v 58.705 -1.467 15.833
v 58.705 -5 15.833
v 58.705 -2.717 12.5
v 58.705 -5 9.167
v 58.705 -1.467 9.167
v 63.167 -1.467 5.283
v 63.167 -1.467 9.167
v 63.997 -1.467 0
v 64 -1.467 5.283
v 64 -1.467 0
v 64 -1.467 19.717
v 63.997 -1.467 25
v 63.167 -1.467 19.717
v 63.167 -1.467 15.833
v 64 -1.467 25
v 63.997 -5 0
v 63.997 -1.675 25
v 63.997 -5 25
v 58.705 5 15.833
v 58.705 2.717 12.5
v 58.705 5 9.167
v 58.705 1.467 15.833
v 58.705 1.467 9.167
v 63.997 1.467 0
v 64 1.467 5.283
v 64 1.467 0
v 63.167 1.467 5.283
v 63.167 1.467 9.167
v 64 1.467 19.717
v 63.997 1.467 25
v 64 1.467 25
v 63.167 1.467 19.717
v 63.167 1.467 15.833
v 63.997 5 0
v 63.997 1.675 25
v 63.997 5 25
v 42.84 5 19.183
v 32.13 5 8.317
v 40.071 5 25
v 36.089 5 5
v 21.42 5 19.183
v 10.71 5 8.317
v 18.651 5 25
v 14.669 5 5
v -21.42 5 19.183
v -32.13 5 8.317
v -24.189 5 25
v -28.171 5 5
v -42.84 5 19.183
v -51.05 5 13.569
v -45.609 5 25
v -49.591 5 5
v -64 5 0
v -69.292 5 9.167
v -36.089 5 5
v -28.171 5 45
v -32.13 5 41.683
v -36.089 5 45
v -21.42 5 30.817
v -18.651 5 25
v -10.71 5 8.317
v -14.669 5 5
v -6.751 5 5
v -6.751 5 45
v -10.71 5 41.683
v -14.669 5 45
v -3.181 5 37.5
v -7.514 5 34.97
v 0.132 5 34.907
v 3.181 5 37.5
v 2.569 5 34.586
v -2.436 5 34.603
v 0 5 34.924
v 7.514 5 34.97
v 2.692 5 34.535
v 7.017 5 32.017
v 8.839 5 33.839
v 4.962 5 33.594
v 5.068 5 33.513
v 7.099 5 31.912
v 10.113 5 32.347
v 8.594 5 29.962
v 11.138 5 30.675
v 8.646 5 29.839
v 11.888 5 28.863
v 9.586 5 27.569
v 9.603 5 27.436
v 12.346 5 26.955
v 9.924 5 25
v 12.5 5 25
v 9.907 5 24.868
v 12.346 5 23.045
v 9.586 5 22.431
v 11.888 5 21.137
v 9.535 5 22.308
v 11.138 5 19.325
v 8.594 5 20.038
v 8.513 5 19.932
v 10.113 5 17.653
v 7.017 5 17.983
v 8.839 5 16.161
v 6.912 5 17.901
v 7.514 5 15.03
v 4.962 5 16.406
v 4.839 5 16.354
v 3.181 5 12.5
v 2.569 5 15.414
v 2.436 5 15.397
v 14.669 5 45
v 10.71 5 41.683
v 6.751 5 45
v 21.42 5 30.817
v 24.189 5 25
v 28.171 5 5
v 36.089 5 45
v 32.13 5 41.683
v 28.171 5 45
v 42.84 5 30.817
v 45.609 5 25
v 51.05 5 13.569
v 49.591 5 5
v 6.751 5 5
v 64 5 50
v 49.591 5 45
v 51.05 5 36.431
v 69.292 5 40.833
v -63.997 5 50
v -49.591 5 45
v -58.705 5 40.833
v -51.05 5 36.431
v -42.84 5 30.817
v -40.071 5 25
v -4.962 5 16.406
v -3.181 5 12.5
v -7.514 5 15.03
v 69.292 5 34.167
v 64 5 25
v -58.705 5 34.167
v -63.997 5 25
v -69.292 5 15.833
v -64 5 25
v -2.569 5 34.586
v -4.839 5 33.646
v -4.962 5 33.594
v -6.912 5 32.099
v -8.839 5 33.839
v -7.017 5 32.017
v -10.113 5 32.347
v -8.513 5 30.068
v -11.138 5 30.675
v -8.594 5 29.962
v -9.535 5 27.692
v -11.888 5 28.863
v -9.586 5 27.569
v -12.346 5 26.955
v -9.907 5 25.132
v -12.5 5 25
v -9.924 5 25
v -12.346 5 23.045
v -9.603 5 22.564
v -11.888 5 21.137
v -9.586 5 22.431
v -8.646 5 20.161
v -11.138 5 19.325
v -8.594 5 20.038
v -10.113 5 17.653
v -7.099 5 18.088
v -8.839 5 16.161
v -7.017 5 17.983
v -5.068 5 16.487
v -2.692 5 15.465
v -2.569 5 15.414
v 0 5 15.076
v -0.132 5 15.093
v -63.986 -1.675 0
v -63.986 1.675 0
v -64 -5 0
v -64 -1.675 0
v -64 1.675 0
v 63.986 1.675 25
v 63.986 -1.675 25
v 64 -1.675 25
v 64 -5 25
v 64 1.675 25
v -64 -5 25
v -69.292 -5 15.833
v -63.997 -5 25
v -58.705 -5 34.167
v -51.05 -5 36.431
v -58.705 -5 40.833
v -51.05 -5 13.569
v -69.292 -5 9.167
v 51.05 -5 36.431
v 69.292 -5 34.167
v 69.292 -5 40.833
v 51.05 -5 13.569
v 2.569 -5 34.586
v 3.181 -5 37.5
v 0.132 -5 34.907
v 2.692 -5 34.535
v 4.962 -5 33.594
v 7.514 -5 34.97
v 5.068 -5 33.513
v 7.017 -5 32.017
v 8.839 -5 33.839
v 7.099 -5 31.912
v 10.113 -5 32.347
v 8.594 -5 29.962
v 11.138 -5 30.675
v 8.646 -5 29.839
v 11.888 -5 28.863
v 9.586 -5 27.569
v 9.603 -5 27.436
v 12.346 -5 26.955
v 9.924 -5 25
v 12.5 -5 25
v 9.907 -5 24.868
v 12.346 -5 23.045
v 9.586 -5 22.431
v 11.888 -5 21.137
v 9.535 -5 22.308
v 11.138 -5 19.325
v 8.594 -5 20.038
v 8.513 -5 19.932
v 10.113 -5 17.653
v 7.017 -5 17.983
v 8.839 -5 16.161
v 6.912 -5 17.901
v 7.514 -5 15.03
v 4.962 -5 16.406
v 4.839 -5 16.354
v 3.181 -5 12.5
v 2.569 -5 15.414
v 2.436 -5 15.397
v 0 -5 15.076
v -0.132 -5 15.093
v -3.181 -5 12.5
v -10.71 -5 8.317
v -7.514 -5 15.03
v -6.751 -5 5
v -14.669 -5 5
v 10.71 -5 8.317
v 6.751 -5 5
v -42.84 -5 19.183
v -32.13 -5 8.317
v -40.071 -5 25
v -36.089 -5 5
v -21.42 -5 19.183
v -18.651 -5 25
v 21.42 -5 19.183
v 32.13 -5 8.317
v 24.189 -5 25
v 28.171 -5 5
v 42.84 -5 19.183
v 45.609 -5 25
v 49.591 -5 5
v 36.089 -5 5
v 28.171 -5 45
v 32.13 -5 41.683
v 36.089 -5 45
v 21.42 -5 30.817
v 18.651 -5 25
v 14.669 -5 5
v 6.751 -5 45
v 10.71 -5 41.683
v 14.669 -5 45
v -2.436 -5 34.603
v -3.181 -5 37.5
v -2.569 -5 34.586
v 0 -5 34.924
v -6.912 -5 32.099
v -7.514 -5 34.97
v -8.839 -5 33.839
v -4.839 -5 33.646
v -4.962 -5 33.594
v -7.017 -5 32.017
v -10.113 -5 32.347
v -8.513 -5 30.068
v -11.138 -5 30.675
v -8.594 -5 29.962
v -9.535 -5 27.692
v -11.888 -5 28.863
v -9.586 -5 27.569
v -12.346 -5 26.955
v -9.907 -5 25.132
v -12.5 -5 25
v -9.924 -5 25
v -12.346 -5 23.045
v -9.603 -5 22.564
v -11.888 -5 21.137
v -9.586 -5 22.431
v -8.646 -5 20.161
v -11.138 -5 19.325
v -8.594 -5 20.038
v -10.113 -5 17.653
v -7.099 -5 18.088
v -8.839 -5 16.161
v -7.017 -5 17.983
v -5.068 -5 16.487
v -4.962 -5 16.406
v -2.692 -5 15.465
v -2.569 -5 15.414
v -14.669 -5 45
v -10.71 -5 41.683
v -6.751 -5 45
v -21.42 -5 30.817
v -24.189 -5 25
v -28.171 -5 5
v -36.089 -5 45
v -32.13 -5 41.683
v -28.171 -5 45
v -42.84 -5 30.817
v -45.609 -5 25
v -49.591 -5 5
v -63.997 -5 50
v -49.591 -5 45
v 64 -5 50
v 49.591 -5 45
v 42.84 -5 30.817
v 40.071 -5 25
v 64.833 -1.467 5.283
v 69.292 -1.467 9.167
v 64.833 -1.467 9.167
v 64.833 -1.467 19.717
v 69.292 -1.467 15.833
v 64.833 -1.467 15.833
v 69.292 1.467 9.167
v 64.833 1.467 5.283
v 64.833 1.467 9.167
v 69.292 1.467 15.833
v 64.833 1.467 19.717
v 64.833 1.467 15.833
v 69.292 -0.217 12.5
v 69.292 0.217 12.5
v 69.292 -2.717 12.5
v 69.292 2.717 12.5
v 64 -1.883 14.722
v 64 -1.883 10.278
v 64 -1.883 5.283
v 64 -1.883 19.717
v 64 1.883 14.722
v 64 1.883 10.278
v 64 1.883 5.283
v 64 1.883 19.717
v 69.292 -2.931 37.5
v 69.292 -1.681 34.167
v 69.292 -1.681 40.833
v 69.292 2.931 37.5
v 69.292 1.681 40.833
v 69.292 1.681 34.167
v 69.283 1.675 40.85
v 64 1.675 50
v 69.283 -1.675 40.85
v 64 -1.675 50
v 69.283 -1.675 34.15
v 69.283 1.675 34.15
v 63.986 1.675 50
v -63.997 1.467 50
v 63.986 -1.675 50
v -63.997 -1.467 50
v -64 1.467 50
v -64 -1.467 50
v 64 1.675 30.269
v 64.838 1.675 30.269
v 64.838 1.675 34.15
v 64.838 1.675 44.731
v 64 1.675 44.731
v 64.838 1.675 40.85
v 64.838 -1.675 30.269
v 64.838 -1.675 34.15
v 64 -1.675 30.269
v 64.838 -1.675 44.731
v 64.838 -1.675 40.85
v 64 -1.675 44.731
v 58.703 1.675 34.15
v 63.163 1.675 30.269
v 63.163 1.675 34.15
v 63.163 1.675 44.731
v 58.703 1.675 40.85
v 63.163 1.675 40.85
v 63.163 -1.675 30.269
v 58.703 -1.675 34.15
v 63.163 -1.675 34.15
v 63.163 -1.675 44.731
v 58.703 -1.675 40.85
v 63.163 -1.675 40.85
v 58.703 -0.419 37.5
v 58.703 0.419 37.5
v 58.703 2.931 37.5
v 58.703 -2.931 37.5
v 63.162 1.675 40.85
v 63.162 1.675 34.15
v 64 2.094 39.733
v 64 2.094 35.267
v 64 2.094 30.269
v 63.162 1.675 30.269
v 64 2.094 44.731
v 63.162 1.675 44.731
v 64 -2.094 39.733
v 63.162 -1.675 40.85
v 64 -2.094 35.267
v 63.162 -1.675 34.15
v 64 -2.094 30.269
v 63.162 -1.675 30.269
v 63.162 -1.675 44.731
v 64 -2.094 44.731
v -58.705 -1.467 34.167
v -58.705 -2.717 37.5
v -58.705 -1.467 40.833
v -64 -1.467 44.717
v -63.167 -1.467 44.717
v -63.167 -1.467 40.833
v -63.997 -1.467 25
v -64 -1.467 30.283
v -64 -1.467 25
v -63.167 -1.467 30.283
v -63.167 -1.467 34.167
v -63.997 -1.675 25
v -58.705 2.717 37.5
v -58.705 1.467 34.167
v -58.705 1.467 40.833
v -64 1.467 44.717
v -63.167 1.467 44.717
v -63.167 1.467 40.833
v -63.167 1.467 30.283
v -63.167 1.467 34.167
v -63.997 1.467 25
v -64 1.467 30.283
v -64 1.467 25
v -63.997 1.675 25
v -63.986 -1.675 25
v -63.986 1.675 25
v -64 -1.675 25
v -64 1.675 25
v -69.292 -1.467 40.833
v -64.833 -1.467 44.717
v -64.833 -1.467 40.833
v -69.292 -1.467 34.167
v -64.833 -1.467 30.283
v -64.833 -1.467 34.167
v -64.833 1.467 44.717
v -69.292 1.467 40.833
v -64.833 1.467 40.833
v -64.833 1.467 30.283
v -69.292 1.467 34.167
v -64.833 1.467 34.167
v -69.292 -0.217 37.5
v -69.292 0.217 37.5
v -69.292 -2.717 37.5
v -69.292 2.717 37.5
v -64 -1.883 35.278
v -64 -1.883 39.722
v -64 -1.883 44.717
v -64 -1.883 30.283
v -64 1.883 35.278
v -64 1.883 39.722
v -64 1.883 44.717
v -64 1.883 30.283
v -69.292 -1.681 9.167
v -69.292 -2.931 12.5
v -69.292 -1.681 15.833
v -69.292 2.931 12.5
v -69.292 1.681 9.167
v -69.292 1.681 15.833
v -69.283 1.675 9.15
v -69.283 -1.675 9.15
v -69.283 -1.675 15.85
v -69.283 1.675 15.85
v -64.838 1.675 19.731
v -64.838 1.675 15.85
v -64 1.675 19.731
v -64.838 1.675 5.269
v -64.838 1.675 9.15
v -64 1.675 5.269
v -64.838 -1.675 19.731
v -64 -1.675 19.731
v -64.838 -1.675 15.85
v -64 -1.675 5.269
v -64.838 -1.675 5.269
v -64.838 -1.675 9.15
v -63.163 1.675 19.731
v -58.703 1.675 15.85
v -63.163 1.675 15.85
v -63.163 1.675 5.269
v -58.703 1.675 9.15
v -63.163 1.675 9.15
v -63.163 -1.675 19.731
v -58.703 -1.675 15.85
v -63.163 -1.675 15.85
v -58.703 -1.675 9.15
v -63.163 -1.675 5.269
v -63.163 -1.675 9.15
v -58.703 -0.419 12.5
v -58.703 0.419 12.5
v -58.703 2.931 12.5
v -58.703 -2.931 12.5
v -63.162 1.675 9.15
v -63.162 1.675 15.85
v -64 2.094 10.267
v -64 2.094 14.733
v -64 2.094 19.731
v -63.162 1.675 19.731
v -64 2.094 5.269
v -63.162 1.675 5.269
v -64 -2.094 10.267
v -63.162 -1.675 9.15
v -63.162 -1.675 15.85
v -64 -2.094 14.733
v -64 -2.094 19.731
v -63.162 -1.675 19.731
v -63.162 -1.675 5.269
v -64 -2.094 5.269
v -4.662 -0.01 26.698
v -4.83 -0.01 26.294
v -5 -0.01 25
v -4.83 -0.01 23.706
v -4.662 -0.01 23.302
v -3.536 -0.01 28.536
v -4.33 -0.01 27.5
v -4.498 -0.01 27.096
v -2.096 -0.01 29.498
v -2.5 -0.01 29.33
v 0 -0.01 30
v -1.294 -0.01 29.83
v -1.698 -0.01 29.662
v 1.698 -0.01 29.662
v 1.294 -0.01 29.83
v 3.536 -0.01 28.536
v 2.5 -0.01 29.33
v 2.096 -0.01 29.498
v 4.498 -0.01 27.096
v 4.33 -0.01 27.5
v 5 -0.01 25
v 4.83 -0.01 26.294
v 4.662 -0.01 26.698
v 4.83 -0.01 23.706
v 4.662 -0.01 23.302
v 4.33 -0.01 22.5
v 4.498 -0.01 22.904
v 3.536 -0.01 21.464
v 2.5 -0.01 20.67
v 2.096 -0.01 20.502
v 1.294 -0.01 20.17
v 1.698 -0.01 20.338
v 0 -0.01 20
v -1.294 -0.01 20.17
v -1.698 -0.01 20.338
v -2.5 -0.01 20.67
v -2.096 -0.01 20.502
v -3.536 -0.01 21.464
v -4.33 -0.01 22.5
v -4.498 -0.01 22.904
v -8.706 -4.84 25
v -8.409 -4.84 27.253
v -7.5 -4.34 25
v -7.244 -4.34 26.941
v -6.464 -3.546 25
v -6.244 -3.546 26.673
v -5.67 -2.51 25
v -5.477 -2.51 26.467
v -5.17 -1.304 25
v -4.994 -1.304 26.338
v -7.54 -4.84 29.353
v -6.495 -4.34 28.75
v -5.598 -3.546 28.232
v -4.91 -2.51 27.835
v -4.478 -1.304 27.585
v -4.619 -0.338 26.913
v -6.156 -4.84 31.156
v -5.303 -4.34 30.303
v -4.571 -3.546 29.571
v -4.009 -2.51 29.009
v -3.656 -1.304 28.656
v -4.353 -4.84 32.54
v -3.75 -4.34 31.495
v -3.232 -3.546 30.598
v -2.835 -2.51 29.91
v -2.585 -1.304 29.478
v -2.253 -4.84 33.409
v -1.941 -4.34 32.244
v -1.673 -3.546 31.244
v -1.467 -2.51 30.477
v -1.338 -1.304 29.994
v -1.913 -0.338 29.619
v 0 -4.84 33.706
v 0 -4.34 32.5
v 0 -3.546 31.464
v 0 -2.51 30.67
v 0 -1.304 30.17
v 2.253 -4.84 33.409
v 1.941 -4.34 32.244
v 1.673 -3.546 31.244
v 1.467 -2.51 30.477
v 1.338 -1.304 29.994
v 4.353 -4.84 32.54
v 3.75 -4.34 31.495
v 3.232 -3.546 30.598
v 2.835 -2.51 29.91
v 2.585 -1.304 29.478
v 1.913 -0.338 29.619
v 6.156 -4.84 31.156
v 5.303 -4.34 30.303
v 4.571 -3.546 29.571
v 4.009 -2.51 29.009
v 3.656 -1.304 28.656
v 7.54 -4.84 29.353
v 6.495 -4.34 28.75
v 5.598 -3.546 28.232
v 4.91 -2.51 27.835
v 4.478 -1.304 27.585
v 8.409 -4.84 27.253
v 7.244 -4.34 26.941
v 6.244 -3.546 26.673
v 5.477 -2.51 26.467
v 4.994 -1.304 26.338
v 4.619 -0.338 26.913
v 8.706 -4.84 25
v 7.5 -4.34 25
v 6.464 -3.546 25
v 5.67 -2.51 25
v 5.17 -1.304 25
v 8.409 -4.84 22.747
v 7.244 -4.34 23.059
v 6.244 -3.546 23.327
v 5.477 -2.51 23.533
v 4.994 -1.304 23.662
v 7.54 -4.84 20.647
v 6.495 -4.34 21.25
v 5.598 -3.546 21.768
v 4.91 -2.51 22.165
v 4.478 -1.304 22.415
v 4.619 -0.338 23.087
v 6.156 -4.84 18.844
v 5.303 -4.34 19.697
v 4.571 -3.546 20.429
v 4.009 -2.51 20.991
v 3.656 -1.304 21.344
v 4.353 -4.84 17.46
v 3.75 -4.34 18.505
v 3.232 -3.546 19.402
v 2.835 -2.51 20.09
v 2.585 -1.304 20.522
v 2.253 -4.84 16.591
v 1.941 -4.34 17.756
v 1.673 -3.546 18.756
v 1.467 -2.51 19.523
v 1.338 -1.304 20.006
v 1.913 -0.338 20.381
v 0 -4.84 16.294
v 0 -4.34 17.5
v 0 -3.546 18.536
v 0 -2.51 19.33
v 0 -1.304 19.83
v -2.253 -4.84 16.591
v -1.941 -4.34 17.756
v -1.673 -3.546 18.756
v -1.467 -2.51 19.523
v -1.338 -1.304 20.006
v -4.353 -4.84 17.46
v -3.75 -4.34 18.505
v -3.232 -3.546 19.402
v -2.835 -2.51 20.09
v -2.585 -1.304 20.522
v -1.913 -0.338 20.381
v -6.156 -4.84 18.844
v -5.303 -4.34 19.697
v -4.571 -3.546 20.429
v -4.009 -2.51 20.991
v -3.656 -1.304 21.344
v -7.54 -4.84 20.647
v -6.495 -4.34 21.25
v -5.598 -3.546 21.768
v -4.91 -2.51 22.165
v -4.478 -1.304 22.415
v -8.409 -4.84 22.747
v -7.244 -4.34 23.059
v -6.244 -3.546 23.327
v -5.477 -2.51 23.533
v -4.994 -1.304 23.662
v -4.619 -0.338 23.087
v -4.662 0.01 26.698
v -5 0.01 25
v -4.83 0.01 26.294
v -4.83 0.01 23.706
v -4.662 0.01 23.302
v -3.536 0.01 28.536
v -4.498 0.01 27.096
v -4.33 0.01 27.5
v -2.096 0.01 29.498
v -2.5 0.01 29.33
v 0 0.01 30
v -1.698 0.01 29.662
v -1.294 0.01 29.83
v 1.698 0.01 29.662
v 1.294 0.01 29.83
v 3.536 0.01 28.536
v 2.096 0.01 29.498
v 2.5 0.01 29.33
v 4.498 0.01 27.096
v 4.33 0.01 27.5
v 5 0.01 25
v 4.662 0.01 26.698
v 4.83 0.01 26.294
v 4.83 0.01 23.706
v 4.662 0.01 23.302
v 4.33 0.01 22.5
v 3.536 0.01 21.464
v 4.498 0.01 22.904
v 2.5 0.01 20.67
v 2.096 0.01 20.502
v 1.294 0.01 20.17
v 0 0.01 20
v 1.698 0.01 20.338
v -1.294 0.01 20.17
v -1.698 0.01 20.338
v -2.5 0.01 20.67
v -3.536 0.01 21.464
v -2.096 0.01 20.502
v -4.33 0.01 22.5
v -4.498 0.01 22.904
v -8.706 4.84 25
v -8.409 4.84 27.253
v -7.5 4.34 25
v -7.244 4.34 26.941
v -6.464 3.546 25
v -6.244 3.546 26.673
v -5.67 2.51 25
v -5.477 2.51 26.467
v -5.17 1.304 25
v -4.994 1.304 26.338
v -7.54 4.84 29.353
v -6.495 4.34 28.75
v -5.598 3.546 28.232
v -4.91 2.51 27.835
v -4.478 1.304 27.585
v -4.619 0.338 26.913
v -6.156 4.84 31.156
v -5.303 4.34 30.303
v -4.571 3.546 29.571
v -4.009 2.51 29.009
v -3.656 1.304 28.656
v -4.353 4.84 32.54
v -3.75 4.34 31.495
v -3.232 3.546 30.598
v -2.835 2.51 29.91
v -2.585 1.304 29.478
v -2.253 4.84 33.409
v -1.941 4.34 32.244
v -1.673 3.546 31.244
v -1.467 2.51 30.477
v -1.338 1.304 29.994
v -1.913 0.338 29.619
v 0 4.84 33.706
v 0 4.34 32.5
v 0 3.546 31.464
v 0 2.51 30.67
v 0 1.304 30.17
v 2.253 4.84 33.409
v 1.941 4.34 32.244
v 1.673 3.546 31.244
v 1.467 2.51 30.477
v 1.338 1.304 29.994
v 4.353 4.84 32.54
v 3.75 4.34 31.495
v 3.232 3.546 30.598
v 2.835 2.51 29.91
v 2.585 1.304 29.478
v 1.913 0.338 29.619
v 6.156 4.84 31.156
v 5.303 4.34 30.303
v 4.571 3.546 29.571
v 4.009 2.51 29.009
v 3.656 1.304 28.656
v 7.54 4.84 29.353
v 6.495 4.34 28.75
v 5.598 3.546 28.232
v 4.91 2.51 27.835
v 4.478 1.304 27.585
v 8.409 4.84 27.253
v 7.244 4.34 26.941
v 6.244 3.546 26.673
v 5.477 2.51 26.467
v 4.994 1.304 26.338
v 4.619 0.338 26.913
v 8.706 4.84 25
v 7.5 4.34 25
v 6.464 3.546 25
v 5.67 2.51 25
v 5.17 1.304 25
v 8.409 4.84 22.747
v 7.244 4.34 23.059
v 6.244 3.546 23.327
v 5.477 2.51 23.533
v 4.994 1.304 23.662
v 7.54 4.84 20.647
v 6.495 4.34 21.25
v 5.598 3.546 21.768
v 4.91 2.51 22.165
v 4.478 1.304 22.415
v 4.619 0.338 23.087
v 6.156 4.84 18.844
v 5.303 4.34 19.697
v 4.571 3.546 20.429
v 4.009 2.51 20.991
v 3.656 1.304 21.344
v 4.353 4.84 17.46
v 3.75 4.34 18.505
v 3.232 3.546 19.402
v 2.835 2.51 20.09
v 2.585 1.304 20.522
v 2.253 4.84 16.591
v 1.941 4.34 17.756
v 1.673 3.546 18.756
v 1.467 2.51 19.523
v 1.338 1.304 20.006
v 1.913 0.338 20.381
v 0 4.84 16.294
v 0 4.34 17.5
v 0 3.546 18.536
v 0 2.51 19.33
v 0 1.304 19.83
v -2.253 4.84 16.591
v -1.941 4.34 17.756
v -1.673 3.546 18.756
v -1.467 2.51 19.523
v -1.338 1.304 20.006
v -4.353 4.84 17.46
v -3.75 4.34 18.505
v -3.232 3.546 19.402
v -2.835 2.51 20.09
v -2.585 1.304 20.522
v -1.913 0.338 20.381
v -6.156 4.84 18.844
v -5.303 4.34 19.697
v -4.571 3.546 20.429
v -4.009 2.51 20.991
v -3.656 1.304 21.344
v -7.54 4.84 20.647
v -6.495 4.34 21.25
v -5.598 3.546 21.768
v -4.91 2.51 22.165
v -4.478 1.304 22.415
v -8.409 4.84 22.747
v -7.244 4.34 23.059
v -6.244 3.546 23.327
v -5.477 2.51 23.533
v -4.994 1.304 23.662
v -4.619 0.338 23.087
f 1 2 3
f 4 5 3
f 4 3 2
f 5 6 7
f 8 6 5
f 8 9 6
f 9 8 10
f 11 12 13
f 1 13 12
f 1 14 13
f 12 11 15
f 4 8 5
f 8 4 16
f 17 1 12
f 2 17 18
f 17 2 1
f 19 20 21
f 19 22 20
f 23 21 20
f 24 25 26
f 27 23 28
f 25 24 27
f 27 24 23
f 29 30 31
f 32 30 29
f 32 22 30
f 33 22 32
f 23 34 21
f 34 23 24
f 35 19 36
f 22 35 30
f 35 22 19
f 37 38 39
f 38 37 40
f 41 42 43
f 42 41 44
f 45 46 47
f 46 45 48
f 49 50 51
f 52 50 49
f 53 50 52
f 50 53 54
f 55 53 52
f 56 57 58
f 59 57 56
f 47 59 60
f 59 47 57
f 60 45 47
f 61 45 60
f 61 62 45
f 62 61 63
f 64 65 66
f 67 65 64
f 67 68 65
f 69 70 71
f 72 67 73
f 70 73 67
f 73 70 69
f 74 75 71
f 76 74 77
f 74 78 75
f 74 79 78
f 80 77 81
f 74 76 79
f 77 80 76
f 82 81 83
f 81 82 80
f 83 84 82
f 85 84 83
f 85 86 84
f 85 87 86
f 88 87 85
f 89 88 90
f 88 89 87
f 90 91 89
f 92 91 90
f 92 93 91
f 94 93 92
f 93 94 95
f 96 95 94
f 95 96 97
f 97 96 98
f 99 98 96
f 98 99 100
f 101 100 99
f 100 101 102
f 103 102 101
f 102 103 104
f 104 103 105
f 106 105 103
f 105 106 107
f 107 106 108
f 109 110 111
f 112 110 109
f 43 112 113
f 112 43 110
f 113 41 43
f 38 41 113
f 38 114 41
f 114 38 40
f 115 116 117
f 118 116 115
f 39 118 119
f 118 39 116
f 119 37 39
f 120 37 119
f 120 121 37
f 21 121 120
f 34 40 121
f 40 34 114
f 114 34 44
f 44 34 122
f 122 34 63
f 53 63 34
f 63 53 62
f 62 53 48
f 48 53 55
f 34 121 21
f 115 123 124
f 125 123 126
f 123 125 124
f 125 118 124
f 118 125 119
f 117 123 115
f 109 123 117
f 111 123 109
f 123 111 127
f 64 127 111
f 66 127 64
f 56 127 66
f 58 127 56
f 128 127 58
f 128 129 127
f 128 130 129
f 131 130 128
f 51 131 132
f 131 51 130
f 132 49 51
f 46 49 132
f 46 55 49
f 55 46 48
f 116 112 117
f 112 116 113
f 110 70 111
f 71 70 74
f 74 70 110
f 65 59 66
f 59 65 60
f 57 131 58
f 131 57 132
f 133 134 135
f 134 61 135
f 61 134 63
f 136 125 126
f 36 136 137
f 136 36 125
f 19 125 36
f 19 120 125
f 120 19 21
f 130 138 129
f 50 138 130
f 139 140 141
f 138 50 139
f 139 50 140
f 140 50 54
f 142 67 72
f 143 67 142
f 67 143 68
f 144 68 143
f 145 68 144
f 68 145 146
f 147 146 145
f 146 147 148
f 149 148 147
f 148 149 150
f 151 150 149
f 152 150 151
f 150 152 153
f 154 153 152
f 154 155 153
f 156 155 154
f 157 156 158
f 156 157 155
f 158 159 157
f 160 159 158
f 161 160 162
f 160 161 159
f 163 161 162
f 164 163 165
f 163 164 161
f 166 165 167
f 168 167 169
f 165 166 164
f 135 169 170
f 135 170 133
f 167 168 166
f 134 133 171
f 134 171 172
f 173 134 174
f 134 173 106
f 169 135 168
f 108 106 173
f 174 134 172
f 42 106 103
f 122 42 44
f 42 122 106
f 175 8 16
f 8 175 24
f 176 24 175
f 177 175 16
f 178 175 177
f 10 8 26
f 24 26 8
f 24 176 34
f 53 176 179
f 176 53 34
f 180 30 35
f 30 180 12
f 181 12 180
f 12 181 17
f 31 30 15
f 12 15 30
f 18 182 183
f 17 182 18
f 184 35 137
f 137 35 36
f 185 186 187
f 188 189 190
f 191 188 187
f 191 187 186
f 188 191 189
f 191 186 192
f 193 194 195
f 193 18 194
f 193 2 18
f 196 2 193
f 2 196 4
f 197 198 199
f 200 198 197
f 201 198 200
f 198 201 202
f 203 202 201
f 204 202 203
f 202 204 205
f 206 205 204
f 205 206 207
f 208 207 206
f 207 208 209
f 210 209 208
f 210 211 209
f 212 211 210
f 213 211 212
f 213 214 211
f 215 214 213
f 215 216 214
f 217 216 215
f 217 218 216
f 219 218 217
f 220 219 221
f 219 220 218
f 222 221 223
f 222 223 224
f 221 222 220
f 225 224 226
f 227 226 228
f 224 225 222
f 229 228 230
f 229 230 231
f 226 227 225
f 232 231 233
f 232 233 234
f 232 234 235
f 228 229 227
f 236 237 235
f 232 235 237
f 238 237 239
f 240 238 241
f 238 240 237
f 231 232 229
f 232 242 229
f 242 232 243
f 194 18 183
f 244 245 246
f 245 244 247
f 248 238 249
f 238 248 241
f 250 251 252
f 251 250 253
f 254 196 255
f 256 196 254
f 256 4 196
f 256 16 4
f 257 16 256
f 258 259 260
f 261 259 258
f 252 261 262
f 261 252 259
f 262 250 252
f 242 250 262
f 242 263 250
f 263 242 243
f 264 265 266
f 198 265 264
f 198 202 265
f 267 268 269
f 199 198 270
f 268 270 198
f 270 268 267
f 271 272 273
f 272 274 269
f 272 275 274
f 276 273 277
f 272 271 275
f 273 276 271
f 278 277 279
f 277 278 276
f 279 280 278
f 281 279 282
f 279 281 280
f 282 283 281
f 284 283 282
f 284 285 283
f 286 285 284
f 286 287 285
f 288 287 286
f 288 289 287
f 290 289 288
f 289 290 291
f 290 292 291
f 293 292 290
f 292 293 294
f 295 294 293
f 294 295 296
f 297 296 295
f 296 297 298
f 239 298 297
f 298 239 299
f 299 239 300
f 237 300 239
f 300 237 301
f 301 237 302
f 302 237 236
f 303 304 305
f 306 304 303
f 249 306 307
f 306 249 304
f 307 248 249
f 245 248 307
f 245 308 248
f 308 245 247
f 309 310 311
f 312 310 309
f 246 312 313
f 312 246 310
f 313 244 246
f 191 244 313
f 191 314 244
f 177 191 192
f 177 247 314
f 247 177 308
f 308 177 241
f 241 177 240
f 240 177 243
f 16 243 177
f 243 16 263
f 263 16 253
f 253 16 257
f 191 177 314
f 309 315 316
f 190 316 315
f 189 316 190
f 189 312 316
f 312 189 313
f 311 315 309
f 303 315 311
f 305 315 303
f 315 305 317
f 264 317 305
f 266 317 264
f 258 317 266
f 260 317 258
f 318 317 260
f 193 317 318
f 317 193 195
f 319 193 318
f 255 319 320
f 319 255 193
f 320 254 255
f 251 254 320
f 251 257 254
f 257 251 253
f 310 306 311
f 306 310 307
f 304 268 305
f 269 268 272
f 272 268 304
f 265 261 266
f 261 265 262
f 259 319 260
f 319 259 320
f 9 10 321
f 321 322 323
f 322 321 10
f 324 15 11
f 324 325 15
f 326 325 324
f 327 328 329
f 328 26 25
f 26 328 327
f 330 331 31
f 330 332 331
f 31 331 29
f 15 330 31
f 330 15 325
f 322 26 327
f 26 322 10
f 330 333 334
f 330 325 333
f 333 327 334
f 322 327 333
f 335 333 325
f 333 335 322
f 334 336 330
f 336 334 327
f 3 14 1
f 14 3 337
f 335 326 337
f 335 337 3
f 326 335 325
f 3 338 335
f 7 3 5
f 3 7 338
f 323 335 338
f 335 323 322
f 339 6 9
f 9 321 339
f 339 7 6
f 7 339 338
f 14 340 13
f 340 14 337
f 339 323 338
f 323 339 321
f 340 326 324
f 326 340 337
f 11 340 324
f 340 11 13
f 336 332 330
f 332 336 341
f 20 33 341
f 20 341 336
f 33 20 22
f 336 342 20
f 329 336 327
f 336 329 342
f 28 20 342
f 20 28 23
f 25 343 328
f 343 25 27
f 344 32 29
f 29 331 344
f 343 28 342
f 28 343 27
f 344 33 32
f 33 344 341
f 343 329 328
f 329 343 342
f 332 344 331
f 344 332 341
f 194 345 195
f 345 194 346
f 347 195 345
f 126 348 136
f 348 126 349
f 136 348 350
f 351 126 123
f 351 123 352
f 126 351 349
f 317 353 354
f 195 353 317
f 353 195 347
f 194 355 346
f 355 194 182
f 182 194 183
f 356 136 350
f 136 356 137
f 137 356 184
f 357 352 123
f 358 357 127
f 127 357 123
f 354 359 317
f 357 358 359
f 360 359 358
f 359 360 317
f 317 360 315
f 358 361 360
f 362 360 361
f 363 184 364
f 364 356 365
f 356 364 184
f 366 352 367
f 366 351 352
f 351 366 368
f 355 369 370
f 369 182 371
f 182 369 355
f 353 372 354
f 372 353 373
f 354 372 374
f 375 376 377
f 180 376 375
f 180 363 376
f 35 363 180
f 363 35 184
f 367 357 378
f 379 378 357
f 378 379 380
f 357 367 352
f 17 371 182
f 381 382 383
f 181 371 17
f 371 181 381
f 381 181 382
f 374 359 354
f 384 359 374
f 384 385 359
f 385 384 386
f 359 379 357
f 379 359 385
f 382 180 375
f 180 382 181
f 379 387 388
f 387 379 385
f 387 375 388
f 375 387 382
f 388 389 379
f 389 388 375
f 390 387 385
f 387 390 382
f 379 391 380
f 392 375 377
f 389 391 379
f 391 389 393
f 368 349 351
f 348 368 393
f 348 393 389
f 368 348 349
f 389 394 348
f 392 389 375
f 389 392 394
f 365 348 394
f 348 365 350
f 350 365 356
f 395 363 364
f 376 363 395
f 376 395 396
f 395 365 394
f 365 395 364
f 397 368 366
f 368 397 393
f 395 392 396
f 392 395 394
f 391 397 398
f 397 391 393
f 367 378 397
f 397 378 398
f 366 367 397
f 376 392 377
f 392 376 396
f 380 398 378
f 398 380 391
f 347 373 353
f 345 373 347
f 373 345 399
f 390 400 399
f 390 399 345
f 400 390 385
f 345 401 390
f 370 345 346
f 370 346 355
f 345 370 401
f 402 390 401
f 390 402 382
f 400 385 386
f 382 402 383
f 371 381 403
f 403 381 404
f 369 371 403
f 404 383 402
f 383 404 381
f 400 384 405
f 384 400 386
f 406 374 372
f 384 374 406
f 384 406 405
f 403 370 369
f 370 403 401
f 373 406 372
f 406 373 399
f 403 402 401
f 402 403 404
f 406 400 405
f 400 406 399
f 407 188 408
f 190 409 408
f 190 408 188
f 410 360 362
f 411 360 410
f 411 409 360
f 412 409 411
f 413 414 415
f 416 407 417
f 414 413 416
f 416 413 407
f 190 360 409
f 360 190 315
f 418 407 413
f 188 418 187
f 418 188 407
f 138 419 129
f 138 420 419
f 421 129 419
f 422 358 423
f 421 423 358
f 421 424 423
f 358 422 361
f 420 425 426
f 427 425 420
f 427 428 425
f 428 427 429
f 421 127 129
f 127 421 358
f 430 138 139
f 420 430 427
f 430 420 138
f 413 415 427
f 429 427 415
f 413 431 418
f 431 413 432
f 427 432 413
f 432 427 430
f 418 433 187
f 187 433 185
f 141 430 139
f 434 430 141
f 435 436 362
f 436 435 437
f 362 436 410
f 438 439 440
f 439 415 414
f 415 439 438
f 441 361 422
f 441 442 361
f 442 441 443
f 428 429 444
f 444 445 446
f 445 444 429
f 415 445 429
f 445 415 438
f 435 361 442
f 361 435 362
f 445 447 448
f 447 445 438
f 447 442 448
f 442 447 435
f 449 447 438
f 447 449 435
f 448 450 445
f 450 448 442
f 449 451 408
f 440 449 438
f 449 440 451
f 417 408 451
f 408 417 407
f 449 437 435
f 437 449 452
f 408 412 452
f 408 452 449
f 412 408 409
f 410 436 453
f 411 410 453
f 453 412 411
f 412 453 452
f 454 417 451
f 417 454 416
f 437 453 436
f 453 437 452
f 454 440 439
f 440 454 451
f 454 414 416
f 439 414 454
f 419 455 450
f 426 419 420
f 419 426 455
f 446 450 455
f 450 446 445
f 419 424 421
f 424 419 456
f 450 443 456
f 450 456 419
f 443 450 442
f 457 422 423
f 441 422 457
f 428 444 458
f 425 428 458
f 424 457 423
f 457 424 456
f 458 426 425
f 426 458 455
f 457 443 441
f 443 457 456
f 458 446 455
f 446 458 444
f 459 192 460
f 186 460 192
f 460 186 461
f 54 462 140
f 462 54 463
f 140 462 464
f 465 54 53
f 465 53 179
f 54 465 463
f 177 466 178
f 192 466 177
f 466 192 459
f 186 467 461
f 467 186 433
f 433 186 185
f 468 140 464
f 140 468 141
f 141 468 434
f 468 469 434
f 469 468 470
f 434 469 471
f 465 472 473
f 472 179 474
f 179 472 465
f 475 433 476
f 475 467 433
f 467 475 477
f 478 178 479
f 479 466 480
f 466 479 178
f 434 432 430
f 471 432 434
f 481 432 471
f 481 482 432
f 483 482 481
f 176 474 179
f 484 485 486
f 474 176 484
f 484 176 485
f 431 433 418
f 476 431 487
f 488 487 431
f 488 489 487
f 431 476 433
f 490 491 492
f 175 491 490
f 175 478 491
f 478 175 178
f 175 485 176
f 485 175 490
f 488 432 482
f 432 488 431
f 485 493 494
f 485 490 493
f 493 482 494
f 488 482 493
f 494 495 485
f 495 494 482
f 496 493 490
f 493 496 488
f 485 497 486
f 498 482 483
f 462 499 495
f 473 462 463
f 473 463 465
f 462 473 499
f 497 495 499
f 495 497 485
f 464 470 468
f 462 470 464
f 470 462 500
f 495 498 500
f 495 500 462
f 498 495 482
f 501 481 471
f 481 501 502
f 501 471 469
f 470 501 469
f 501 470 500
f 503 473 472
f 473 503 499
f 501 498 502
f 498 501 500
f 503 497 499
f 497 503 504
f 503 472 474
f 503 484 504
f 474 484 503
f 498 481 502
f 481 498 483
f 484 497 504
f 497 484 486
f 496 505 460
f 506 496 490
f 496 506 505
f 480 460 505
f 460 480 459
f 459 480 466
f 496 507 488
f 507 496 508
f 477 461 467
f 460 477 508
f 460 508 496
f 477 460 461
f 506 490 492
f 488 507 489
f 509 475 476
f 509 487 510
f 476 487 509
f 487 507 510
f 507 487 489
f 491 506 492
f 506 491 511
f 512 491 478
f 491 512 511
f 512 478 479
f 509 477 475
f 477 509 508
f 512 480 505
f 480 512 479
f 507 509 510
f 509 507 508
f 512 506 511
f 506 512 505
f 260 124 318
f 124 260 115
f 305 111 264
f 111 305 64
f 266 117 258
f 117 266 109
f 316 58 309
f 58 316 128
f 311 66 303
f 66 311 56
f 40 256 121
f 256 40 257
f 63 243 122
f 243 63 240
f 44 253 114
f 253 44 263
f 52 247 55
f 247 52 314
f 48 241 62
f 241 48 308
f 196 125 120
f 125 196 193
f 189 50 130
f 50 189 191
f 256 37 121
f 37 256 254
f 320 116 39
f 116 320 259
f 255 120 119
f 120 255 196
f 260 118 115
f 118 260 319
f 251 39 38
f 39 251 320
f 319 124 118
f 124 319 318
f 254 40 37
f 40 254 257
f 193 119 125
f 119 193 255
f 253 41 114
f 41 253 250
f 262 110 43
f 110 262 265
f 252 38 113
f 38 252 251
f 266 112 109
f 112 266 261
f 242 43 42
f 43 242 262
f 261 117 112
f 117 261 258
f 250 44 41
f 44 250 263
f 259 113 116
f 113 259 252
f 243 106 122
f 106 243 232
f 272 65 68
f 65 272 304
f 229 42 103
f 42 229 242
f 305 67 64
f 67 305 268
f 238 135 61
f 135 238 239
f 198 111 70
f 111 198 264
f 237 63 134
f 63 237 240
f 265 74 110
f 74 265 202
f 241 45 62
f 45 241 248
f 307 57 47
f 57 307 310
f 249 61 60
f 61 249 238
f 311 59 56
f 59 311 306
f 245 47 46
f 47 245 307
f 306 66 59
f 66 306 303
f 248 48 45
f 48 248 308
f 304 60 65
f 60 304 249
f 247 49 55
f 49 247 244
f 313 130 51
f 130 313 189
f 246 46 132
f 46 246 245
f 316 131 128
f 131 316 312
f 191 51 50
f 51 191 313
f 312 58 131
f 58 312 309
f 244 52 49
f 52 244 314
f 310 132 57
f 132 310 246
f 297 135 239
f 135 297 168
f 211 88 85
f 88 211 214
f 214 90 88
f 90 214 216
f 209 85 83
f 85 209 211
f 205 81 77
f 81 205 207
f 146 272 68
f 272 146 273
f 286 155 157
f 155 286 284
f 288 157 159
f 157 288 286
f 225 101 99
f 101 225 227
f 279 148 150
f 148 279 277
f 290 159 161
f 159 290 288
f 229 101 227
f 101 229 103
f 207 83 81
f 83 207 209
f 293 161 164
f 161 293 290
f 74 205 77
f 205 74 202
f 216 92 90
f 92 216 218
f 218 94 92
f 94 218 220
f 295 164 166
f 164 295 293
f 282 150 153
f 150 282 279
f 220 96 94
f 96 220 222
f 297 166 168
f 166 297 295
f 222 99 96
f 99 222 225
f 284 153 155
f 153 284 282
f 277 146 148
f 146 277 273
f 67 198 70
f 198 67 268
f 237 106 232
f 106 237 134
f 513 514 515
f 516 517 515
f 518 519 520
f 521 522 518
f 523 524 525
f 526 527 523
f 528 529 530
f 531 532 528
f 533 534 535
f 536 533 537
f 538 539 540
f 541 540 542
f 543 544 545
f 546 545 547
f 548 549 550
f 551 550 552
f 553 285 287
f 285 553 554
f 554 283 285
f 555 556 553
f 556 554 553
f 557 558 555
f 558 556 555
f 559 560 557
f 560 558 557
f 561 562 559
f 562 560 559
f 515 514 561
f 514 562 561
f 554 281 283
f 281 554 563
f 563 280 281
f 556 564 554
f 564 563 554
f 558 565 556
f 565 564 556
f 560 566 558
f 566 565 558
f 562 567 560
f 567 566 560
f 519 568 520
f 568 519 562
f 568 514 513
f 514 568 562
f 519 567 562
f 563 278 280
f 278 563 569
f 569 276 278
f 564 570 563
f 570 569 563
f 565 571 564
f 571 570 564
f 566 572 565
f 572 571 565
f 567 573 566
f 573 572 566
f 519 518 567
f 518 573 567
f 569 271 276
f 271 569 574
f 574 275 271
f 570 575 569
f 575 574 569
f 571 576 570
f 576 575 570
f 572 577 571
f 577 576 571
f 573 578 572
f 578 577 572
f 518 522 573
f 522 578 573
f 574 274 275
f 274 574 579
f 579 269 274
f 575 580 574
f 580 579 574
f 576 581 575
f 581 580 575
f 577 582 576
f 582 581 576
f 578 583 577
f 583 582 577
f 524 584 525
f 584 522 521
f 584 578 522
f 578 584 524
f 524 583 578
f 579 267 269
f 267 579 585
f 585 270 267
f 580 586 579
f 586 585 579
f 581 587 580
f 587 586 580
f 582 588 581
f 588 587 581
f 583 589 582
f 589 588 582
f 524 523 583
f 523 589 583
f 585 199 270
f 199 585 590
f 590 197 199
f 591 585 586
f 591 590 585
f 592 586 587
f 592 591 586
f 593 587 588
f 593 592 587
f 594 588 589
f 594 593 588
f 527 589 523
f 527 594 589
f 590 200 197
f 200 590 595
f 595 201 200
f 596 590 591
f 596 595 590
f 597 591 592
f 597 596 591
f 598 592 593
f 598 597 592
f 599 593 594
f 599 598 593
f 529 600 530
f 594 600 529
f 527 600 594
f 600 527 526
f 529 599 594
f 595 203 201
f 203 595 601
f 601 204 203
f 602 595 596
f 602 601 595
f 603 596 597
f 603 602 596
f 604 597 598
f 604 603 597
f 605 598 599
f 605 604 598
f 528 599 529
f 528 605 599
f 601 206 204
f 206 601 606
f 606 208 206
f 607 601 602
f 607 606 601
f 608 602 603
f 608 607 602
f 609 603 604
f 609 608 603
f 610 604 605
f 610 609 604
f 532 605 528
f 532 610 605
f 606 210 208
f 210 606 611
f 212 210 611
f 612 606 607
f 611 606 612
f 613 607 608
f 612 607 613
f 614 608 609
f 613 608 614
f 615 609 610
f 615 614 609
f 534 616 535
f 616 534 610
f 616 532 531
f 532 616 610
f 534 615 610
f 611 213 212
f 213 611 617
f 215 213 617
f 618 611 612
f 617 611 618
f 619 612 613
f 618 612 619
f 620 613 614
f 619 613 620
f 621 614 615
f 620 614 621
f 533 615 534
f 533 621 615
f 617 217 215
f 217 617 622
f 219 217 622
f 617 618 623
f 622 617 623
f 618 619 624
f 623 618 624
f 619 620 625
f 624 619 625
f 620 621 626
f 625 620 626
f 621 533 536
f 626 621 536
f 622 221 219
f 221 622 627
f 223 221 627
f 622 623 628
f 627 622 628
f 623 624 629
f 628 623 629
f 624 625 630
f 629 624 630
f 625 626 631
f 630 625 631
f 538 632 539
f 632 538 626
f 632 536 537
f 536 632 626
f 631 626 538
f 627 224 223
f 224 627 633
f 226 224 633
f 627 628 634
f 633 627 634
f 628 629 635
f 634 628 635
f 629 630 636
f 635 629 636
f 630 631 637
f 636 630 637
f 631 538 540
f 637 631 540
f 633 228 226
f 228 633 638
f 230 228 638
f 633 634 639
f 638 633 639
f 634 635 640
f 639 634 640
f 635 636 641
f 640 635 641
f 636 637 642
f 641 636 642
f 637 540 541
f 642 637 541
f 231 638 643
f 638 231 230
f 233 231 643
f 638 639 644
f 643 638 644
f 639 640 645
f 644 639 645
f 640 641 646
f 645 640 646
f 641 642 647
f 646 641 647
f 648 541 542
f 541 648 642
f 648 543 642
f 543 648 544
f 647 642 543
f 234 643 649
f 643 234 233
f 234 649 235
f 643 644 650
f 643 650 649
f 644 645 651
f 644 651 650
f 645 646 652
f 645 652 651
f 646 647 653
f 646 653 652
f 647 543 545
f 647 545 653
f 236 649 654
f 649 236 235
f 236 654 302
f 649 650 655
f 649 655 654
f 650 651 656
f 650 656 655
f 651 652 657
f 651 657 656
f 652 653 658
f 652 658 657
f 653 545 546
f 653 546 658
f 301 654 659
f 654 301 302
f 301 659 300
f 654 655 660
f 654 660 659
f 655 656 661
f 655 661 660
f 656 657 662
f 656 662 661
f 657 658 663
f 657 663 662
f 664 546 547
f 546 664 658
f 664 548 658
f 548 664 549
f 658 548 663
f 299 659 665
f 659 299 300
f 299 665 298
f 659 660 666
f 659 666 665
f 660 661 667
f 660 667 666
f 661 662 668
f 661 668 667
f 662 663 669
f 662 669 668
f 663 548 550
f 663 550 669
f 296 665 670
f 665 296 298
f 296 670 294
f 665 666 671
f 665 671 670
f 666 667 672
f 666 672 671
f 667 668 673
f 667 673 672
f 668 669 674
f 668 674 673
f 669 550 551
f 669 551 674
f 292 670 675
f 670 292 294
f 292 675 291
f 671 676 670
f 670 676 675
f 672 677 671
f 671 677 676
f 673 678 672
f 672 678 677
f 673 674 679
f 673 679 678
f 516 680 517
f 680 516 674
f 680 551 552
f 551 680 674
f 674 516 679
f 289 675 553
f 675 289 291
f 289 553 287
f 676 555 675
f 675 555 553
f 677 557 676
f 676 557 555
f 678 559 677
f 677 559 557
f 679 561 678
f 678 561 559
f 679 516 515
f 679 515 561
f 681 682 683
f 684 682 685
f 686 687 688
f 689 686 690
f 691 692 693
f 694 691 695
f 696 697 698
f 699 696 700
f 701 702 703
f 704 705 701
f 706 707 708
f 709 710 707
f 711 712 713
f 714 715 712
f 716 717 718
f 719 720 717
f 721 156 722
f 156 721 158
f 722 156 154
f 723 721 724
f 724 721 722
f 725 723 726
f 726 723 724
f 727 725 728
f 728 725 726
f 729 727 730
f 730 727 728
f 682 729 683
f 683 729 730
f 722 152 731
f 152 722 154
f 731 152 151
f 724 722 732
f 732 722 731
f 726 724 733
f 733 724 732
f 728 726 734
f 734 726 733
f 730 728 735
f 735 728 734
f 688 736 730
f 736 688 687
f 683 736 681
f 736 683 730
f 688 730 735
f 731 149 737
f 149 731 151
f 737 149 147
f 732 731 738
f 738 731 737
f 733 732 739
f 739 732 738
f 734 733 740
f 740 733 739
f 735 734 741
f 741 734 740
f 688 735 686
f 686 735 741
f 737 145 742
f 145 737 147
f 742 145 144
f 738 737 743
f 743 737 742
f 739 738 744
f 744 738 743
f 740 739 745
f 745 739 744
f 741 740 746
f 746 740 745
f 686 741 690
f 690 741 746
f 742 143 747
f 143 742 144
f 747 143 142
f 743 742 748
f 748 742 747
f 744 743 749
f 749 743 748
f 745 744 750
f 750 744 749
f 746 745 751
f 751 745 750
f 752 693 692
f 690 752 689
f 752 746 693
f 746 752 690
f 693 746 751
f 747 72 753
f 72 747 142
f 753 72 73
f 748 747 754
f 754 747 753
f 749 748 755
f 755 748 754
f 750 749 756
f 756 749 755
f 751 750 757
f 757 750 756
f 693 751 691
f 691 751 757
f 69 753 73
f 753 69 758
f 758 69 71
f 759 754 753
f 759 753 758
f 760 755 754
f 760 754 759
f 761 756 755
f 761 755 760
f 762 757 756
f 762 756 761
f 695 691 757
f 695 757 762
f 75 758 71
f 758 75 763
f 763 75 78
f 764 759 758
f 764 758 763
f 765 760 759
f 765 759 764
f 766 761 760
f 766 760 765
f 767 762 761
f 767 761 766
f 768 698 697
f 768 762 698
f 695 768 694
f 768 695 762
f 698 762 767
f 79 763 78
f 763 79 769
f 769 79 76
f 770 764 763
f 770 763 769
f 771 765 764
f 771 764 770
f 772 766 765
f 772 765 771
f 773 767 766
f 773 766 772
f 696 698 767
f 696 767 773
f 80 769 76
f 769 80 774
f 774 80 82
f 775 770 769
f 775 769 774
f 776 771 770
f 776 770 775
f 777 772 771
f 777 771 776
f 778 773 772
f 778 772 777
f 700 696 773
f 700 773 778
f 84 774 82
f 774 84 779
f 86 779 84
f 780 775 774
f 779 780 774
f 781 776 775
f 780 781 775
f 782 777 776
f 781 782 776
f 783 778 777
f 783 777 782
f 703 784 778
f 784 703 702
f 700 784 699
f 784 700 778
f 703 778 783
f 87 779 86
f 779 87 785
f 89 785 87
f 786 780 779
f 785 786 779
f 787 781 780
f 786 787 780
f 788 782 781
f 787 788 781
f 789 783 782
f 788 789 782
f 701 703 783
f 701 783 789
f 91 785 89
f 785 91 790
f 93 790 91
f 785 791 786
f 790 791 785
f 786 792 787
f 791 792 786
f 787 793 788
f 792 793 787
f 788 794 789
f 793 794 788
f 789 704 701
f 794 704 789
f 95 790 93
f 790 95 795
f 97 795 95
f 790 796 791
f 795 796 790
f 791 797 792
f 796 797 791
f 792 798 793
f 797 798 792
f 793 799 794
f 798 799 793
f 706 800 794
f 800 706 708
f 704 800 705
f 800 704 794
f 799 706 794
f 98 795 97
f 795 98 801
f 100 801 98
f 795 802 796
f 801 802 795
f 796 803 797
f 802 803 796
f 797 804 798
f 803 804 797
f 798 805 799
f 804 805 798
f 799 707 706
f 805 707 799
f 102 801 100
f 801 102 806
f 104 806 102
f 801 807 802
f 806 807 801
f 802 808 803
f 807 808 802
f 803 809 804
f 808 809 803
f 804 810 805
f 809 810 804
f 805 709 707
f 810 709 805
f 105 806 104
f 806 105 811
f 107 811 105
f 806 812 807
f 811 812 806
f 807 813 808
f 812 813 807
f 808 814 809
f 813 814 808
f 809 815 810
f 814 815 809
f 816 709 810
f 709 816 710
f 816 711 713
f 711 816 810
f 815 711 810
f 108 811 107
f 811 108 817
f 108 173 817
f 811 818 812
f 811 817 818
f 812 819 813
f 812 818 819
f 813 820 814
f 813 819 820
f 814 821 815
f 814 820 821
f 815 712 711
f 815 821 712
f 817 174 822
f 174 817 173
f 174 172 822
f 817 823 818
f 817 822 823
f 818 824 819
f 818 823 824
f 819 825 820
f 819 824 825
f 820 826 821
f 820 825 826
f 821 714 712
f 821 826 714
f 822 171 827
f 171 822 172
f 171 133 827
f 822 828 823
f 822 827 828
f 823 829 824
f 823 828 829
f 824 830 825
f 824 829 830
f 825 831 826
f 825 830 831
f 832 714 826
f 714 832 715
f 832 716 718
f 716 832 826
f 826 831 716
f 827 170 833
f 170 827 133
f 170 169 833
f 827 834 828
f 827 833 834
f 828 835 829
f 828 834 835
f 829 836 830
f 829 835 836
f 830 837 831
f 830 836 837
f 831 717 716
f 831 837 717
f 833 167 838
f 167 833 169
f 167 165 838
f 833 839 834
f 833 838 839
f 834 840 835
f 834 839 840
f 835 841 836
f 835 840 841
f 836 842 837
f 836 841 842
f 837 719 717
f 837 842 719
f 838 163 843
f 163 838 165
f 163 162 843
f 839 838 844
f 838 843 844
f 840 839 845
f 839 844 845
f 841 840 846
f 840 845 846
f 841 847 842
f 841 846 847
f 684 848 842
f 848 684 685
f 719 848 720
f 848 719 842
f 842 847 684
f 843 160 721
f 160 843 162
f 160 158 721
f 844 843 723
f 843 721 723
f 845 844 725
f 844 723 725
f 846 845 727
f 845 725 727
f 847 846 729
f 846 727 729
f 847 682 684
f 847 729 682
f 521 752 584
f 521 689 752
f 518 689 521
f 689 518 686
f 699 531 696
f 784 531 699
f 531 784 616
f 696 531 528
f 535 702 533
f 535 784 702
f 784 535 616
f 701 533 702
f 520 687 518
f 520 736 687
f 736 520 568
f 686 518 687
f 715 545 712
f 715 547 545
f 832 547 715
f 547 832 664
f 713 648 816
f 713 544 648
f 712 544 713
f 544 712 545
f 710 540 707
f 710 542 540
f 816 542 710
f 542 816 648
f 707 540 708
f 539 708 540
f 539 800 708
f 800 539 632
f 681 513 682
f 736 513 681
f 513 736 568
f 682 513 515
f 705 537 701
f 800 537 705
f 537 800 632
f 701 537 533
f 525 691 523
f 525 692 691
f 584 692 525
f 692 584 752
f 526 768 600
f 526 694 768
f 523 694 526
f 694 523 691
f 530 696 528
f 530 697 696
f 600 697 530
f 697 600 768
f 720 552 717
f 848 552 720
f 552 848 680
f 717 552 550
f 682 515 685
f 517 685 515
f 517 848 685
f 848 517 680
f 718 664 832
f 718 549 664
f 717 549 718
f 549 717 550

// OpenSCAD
include <config.scad>
use <GDMUtils.scad>
use <joiners.scad>



$fa = 2;
$fs = 2;

module bridge_brace_center(explode=0, arrows=false)
{
	l = motor_rail_length;
	hole_diam = 10;
	difference() {
		union() {
			right(l/2) zrot(-90) yrot(90) joiner(h=rail_height, w=joiner_width, l=10, a=joiner_angle);
			left(l/2) zrot(90) yrot(90) joiner(h=rail_height, w=joiner_width, l=10, a=joiner_angle);
			cylinder(d=hole_diam+joiner_width*1.5, h=joiner_width, center=true);
			cube([hole_diam*1.5, hole_diam+joiner_width*1.5, joiner_width], center=true);
			xrot(90) zrot(90) sparse_strut(h=rail_height, l=l-2*8+0.1, thick=joiner_width, strut=5, max_bridge=2*hole_diam);
		}
		cylinder(d=hole_diam, h=joiner_width+0.1, center=true);
		zflip_copy() {
			up(joiner_width/2+0.01) {
				fillet_hole_mask(r=hole_diam/2, fillet=joiner_width/2, $fn=24);
			}
		}
	}
}



module bridge_brace_center_parts() { // make me
	up(rail_height/2) xrot(90) bridge_brace_center();
}


bridge_brace_center_parts();


// vim: noexpandtab tabstop=4 shiftwidth=4 softtabstop=4 nowrap
